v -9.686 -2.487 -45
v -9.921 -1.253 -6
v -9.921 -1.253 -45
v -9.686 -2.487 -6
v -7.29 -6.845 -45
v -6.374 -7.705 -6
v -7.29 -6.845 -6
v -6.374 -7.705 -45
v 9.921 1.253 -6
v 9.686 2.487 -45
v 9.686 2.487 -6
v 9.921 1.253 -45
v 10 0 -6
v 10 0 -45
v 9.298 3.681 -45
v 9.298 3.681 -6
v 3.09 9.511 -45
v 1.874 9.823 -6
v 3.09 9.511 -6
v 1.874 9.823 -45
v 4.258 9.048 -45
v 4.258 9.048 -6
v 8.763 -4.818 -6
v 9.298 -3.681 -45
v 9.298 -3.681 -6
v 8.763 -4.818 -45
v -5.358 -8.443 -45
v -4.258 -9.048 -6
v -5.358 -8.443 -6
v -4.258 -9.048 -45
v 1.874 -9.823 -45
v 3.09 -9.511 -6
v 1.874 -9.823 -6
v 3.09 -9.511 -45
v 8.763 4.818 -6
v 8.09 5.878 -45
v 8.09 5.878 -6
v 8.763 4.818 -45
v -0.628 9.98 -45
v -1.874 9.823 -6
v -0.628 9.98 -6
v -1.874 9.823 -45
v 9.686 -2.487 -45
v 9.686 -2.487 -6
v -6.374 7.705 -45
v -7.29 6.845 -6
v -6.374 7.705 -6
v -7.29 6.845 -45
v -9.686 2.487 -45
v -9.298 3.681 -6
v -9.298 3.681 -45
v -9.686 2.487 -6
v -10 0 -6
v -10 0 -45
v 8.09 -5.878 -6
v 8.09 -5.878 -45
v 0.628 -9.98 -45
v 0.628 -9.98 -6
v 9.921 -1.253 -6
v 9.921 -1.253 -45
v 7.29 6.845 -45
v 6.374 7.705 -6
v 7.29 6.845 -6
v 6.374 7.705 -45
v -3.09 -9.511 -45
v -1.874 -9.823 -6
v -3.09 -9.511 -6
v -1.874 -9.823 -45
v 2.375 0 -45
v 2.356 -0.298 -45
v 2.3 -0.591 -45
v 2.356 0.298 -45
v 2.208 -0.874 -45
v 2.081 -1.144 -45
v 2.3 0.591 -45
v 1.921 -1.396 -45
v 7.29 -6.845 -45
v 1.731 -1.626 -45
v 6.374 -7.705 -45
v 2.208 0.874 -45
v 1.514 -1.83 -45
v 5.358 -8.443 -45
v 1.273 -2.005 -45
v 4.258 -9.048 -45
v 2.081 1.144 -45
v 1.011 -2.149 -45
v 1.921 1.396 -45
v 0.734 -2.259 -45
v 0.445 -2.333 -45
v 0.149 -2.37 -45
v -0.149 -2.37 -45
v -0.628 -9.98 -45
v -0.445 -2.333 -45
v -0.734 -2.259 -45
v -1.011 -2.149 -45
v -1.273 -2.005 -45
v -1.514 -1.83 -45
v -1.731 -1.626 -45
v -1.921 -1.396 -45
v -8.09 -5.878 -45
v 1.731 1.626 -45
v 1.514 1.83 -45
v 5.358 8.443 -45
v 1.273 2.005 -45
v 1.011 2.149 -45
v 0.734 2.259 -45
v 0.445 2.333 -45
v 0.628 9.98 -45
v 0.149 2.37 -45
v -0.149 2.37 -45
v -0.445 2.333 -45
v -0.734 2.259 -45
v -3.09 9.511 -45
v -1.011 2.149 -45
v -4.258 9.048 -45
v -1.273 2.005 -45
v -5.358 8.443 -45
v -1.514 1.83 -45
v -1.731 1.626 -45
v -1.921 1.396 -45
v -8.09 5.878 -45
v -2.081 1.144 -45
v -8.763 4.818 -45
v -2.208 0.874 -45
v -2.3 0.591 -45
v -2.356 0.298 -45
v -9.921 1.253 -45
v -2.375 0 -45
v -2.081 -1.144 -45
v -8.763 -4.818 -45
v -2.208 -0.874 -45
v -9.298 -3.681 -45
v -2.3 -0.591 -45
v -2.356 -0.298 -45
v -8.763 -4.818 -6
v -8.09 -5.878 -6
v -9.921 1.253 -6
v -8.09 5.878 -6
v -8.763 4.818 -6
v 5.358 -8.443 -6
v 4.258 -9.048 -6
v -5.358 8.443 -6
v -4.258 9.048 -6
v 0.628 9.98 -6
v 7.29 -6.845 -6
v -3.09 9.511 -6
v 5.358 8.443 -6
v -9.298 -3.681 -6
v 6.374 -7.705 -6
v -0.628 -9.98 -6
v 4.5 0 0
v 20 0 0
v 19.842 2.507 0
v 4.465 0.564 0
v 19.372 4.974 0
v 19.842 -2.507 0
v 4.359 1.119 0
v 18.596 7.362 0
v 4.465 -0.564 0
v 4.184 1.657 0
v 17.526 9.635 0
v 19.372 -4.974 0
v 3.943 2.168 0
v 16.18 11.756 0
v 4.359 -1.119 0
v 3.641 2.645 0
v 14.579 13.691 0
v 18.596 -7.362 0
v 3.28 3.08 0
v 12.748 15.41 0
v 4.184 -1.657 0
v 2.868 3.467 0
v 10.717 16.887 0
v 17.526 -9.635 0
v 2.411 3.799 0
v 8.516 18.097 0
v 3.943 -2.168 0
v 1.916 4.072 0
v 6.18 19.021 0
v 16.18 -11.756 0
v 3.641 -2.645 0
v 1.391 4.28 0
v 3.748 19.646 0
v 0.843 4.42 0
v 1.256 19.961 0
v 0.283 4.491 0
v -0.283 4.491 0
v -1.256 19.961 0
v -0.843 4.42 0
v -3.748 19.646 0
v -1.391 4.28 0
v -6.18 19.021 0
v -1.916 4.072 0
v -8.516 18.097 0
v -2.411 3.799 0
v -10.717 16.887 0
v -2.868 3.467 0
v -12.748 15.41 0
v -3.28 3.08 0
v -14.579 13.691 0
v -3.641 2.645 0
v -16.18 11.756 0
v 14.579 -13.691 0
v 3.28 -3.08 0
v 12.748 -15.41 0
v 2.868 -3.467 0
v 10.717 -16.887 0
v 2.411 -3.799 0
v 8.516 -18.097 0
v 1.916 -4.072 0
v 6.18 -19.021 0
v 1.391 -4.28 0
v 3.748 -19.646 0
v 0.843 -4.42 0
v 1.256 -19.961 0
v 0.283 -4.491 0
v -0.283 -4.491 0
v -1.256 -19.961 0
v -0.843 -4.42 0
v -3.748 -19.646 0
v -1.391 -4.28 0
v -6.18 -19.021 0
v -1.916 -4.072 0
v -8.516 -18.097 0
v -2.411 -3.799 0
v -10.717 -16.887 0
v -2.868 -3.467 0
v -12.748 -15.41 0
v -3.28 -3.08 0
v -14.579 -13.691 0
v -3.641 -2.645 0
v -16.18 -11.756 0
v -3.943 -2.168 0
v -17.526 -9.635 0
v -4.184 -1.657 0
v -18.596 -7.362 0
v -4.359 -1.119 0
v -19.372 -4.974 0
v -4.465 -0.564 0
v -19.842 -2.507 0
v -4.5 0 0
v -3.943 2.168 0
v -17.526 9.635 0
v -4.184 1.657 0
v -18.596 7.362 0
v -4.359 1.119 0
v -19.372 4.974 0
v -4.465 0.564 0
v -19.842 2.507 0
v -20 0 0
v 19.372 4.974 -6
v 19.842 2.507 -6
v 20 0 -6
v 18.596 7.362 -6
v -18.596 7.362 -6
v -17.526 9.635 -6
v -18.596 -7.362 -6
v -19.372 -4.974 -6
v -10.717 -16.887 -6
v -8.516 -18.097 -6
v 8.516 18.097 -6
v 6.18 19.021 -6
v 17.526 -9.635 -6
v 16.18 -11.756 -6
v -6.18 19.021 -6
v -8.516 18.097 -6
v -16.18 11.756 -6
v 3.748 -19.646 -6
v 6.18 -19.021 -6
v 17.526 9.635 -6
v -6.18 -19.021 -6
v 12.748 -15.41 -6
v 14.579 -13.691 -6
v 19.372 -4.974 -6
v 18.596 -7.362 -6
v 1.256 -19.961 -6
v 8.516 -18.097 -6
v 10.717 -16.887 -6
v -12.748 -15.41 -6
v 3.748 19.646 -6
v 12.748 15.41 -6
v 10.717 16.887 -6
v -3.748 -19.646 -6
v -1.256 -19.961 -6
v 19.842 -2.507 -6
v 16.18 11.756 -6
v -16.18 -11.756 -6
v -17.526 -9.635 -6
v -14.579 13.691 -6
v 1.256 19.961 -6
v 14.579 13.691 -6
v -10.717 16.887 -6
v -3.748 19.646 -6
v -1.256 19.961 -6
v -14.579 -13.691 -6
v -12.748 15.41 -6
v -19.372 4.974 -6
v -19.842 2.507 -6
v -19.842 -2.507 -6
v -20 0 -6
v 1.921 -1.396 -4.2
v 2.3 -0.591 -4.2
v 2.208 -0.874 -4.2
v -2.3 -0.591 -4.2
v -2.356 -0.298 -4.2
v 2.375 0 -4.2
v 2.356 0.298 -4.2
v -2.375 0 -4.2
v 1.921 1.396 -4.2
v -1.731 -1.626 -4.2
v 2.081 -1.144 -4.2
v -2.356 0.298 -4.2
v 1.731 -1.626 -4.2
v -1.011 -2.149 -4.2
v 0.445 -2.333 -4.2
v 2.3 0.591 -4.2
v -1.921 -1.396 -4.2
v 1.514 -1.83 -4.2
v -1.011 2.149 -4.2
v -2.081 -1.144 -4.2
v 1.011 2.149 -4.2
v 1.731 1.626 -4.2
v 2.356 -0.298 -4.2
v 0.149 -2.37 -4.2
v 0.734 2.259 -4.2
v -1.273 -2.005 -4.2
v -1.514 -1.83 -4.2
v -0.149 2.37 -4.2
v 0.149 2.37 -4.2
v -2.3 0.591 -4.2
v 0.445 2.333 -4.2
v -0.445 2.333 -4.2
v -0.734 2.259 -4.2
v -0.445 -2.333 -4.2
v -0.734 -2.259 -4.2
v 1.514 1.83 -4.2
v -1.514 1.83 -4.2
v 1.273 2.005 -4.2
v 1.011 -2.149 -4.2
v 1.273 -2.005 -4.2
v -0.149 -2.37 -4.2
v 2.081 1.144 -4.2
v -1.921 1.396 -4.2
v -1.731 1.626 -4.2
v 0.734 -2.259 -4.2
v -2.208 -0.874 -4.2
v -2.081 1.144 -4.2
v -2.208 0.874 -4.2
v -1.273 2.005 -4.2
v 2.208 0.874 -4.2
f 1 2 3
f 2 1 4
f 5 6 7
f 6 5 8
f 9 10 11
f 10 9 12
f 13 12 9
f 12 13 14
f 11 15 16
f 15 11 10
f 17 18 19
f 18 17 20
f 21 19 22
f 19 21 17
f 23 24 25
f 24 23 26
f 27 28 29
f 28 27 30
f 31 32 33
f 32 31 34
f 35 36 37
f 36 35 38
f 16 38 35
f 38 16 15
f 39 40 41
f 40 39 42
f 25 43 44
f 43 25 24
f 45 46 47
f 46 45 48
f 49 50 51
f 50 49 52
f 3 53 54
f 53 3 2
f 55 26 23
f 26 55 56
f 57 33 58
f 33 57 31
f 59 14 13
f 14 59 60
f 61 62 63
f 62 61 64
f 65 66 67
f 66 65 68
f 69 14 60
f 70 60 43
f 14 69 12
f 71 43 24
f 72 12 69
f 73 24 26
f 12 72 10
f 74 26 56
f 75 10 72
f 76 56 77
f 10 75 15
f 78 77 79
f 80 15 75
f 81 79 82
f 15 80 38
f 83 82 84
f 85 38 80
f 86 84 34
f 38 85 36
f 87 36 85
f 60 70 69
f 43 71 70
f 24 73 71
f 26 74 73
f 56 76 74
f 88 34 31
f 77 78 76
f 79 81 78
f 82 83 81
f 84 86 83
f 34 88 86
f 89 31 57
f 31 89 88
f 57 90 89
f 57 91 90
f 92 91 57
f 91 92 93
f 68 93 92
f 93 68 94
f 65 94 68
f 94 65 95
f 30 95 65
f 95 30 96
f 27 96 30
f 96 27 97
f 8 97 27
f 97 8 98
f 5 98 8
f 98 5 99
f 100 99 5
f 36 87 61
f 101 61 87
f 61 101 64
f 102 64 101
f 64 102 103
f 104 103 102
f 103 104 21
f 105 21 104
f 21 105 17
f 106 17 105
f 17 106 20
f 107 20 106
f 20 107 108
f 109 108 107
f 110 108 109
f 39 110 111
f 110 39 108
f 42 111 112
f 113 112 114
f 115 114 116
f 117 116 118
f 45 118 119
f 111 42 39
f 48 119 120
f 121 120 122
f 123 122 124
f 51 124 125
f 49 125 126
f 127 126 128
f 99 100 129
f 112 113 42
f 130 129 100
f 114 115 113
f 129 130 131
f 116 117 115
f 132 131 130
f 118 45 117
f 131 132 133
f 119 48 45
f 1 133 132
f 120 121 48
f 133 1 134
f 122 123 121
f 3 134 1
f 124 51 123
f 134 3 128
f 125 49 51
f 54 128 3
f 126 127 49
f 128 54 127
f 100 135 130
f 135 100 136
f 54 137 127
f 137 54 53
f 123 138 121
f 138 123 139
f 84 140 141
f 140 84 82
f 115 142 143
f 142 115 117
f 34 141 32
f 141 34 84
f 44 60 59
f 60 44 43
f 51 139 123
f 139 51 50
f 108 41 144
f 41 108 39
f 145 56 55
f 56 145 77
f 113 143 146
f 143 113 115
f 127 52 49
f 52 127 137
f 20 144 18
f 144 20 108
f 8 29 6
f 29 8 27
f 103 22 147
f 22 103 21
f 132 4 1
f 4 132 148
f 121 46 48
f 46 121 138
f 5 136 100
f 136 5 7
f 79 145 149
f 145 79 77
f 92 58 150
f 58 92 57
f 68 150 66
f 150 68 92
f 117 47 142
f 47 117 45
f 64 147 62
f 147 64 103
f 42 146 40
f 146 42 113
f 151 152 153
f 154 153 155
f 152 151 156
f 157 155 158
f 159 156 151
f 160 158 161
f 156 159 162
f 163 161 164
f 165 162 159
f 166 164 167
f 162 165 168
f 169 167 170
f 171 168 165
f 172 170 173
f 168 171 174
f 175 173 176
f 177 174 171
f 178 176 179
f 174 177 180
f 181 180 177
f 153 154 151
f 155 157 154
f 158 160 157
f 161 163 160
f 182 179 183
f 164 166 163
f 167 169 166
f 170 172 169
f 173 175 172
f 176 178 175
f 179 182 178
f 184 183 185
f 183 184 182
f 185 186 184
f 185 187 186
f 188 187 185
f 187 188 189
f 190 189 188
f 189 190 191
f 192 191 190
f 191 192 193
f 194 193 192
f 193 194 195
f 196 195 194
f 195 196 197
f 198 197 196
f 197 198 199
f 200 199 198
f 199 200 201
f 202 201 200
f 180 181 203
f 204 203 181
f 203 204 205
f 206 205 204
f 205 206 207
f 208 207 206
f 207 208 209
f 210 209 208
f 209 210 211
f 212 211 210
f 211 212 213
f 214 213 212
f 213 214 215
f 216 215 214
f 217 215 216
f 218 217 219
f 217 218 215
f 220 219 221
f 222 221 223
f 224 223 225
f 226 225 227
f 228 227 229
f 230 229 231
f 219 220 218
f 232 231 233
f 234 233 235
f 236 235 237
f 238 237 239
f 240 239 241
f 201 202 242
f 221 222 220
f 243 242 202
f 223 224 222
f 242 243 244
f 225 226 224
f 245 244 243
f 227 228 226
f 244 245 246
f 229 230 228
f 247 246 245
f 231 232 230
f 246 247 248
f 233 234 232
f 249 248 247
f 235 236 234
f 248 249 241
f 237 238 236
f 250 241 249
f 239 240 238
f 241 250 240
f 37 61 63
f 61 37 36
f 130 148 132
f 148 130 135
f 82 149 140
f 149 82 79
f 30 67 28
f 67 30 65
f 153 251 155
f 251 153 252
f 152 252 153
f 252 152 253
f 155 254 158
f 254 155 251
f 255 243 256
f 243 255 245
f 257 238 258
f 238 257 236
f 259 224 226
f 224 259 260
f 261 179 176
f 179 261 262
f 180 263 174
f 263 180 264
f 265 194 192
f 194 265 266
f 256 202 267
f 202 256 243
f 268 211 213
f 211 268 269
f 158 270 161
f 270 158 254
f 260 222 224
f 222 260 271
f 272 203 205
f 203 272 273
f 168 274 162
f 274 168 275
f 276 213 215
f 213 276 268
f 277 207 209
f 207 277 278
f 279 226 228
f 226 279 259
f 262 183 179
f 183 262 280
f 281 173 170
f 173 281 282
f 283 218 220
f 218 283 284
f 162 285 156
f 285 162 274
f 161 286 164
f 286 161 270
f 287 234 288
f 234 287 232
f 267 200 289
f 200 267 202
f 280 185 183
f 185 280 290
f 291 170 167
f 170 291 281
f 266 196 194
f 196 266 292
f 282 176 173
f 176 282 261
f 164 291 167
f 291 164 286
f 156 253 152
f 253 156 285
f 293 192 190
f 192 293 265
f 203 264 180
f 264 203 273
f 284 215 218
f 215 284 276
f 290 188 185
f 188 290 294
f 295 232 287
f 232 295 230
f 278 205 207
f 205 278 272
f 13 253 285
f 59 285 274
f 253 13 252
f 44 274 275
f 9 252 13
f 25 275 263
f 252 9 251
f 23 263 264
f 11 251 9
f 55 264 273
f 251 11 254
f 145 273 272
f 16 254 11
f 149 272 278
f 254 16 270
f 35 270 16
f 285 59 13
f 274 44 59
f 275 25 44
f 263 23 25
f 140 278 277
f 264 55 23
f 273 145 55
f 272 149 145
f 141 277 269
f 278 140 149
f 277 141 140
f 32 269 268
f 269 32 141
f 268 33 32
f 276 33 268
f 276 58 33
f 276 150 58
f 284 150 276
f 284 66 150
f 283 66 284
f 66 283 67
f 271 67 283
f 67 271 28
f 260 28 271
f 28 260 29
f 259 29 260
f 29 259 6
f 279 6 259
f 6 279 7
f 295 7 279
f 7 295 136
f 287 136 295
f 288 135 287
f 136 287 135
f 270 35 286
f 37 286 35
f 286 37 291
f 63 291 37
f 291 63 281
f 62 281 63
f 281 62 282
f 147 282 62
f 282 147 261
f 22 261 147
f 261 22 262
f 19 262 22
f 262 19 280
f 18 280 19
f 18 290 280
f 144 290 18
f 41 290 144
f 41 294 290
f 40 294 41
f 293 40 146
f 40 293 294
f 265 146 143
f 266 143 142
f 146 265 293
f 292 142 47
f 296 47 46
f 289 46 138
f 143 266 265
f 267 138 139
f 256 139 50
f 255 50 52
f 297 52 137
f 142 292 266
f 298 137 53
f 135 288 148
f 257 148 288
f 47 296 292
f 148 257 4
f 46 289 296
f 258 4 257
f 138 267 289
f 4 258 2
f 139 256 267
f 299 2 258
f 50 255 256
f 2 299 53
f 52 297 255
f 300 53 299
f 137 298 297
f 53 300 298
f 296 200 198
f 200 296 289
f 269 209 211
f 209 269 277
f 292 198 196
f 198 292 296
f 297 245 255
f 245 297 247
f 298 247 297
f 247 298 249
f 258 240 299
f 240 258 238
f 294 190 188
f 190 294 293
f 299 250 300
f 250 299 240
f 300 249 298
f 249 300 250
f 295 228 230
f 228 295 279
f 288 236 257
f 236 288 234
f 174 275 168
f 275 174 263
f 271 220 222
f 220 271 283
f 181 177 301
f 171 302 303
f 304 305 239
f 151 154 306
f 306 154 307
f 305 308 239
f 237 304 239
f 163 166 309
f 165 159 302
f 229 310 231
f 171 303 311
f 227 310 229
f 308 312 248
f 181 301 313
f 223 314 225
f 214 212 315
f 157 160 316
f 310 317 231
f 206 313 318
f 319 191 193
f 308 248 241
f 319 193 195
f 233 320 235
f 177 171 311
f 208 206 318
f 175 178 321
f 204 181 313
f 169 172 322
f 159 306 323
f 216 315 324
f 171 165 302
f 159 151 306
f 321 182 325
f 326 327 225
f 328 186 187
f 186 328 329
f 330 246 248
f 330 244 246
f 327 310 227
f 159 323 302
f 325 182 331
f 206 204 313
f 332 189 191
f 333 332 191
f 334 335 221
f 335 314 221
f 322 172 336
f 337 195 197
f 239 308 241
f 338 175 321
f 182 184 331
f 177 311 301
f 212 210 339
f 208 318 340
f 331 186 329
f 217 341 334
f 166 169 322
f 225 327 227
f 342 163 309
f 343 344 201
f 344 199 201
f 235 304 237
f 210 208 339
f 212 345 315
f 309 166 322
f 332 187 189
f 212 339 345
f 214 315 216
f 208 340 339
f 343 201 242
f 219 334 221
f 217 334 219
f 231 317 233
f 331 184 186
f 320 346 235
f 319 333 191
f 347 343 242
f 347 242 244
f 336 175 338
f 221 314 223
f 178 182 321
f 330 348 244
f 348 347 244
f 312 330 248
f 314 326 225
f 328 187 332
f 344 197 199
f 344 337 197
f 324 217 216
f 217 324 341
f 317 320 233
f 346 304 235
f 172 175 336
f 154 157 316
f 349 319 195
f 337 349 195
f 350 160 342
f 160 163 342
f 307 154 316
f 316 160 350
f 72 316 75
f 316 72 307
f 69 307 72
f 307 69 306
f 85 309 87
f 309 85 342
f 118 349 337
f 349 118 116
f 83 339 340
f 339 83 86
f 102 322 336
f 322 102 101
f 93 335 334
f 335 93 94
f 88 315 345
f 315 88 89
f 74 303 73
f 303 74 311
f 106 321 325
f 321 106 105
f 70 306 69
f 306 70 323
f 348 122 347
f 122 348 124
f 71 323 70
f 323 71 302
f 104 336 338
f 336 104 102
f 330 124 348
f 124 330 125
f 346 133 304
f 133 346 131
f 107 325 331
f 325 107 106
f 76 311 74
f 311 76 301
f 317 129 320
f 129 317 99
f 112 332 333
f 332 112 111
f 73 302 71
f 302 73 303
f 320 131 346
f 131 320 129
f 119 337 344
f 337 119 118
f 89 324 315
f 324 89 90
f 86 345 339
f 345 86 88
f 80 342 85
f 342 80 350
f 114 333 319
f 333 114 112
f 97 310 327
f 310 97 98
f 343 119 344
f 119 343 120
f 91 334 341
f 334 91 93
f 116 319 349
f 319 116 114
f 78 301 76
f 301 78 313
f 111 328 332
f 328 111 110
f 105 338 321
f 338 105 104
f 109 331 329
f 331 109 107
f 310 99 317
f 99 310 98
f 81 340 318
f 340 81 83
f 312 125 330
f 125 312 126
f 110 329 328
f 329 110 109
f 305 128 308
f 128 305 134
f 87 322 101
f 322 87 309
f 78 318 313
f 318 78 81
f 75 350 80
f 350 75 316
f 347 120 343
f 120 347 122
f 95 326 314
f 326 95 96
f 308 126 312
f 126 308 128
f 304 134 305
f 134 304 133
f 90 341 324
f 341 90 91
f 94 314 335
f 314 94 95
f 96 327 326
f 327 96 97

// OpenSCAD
$fn = 50;


difference() {
	union() {
		translate(v = [0, 0, -45.0000000000]) {
			cylinder(h = 45, r = 10.0000000000);
		}
		translate(v = [0, 0, -6.0000000000]) {
			cylinder(h = 6, r = 20.0000000000);
		}
	}
	union() {
		translate(v = [0, 0, 0]) {
			rotate(a = [0, 0, 0]) {
				difference() {
					union() {
						#translate(v = [0, 0, -45.0000000000]) {
							cylinder(h = 45, r = 2.2500000000);
						}
						#translate(v = [0, 0, -4.2000000000]) {
							cylinder(h = 4.2000000000, r = 10.0000000000, r1 = 2.3750000000, r2 = 4.5000000000);
						}
						#translate(v = [0, 0, -45.0000000000]) {
							cylinder(h = 45, r = 2.3750000000);
						}
						#translate(v = [0, 0, -45.0000000000]) {
							cylinder(h = 45, r = 2.2500000000);
						}
					}
					union();
				}
			}
		}
	}
}
